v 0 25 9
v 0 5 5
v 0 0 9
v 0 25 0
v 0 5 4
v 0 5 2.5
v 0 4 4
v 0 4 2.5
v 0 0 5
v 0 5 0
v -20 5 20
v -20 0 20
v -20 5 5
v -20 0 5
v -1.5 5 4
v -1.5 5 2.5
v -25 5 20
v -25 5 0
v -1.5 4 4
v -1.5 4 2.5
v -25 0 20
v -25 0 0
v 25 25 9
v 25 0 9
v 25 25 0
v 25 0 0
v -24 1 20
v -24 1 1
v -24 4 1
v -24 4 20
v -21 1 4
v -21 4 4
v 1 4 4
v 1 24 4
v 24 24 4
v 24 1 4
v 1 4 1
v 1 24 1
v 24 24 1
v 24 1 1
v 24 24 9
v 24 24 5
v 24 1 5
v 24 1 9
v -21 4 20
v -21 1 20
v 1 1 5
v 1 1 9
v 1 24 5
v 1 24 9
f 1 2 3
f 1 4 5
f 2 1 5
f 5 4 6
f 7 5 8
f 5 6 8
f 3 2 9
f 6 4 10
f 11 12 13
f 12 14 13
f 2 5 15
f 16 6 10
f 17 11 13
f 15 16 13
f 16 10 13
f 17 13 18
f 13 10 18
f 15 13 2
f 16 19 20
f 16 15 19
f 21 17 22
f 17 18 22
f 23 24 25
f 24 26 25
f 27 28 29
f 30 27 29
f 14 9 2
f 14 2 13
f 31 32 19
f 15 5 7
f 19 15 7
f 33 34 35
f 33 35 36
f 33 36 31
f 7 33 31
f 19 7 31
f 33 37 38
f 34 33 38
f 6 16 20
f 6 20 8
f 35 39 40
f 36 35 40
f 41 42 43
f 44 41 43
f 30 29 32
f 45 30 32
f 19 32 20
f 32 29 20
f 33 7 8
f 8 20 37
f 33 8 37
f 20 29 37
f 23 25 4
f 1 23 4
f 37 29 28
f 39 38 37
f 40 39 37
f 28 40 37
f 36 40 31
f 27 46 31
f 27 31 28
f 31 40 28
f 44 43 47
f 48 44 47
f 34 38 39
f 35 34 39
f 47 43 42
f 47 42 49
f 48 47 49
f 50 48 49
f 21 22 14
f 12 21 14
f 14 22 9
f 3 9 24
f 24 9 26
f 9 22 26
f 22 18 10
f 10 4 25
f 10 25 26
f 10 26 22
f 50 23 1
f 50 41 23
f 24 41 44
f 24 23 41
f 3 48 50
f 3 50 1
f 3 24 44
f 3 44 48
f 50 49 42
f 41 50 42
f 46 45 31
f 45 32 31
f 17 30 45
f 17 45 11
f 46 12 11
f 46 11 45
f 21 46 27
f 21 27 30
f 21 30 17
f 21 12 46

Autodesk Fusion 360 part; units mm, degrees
sketch "Sketch1" plane through (0, 0, 0) normal (0, 0, 1) x (1, 0, 0)
  line L0 (0, 0) -> (25, 0)
  line L1 (25, 0) -> (25, 25)
  line L2 (25, 25) -> (0, 25)
  line L3 (0, 25) -> (0, 5)
  line L4 (0, 0) -> (-20, 0)
  line L5 (-20, 0) -> (-20, 5)
  line L6 (-20, 5) -> (0, 5)
extrude "Extrude1" add sketch "Sketch1" along normal blind 1
sketch "Sketch2" plane through (0, 0, 1) normal (0, 0, 1) x (-1, 0, 0)
  line L0 (20, 0) -> (-25, 0)
  line L1 (-25, 0) -> (-25, -25)
  line L2 (-25, -25) -> (0, -25)
  line L3 (0, -25) -> (0, -5)
  line L4 (0, -5) -> (20, -5)
  line L5 (20, -5) -> (20, 0)
  line L6 (-1, -1) -> (-24, -1)
  line L7 (-24, -1) -> (-24, -24)
  line L8 (-24, -24) -> (-1, -24)
  line L9 (-1, -24) -> (-1, -1)
  line L10 (0, -5) -> (0, 0)
extrude "Extrude2" add sketch "Sketch2" along normal blind 4
sketch "Sketch3" plane through (0, 0, 5) normal (0, 0, 1) x (-1, 0, 0)
  line L0 (-1, -1) -> (-1, -24)
  line L1 (-1, -24) -> (-24, -24)
  line L2 (-24, -24) -> (-24, -1)
  line L3 (-24, -1) -> (-1, -1)
  line L4 (20, -5) -> (20, 0)
  line L5 (20, 0) -> (-25, 0)
  line L6 (-25, 0) -> (-25, -25)
  line L7 (-25, -25) -> (0, -25)
  line L8 (0, -25) -> (0, -5)
  line L9 (0, -5) -> (20, -5)
  line L10 (0, -5) -> (0, 0)
extrude "Extrude3" add sketch "Sketch3" along normal blind 10 contours L5 L6 L7 L8 L10
sketch "Sketch4" plane through (-20, 0, 0) normal (-1, 0, 0) x (0, -1, 0)
  line L0 (-5, 0) -> (0, 0)
  line L1 (0, 0) -> (0, 5)
  line L2 (0, 5) -> (-5, 5)
  line L3 (-5, 5) -> (-5, 0)
  line L4 (-4, 4) -> (-1, 4)
  line L5 (-1, 4) -> (-1, 1)
  line L6 (-1, 1) -> (-4, 1)
  line L7 (-4, 1) -> (-4, 4)
extrude "Extrude4" cut sketch "Sketch4" against normal blind 23 contours L4 L5 L6 L7
sketch "Sketch5" plane through (0, 1, 0) normal (0, 1, 0) x (-1, 0, 0)
  line L0 (-24, 1) -> (20, 1)
  line L1 (20, 1) -> (20, 4)
  line L2 (20, 4) -> (-1, 4)
  line L3 (-1, 4) -> (-1, 15)
  line L4 (-1, 15) -> (-24, 15)
  line L5 (-24, 15) -> (-24, 1)
  line L6 (-1, 4) -> (-24, 4)
  line L7 (-24, 4) -> (-24, 5)
  line L8 (-24, 5) -> (-1, 5)
  line L9 (-1, 4) -> (-1, 5)
extrude "Extrude5" add sketch "Sketch5" along normal blind 23 contours L3 L5 L6 L7 L8 L9
sketch "Sketch6" plane through (0, 5, 0) normal (0, 1, 0) x (-1, 0, 0)
  line L0 (0, 0) -> (20, 0)
  line L1 (20, 0) -> (20, 5)
  line L2 (20, 5) -> (0, 5)
  line L3 (0, 5) -> (0, 0)
  line L4 (0, 4) -> (1.5, 4)
  line L5 (1.5, 4) -> (1.5, 2.5)
  line L6 (1.5, 2.5) -> (0, 2.5)
  line L7 (0, 4) -> (0, 2.5)
extrude "Extrude6" cut sketch "Sketch6" against normal blind 2 contours L3 L4 L5 L6 L7
sketch "Sketch7" plane through (-20, 0, 0) normal (-1, 0, 0) x (0, -1, 0)
  line L0 (-1, 4) -> (-1, 1)
  line L1 (-1, 1) -> (-4, 1)
  line L2 (-4, 1) -> (-4, 4)
  line L3 (-4, 4) -> (-1, 4)
  line L4 (-5, 0) -> (0, 0)
  line L5 (0, 0) -> (0, 5)
  line L6 (0, 5) -> (-5, 5)
  line L7 (-5, 5) -> (-5, 0)
  line L8 (-5, 1) -> (0, 1)
extrude "Extrude7" add sketch "Sketch7" along normal blind 6 contours L1 L4 L5 L7 L8
sketch "Sketch8" plane through (0, 0, 1) normal (0, 0, 1) x (-1, 0, 0)
  line L0 (20, -1) -> (-24, -1)
  line L1 (-24, -1) -> (-24, -24)
  line L2 (-24, -24) -> (-1, -24)
  line L3 (-1, -24) -> (-1, -4)
  line L4 (-1, -4) -> (20, -4)
  line L5 (20, -4) -> (20, -5)
  line L6 (20, -5) -> (26, -5)
  line L7 (26, -5) -> (26, 0)
  line L8 (26, 0) -> (20, 0)
  line L9 (20, 0) -> (20, -1)
  line L10 (20, -1) -> (24, -1)
  line L11 (24, -1) -> (24, -4)
  line L12 (24, -4) -> (20, -4)
extrude "Extrude8" add sketch "Sketch8" along normal blind 4 contours L5 L6 L7 L8 L9 L10 L11 L12
extrude "Extrude9" cut 1 faces at (-26, 3.3333, 1.6667) along direction (1, 0, 0) blind 1
extrude "Extrude10" add 1 faces at (-20, 2, 4.3333) along direction (-1, 0, 0) blind 1
sketch "Sketch9" plane through (0, 0, 5) normal (0, 0, 1) x (-1, 0, 0)
  line L0 (21, -1) -> (24, -1)
  line L1 (24, -1) -> (24, -4)
  line L2 (24, -4) -> (21, -4)
  line L3 (21, -4) -> (21, -1)
  line L4 (25, -5) -> (25, 0)
  line L5 (25, 0) -> (0, 0)
  line L6 (0, 0) -> (0, -5)
  line L7 (0, -5) -> (25, -5)
  line L8 (20, 0) -> (20, -5)
extrude "Extrude11" add sketch "Sketch9" along normal blind 15 contours L4 L5 L7 L8
extrude "Extrude12" cut 1 faces at (16.3333, 0.3333, 15) along direction (0, 0, -1) blind 6
